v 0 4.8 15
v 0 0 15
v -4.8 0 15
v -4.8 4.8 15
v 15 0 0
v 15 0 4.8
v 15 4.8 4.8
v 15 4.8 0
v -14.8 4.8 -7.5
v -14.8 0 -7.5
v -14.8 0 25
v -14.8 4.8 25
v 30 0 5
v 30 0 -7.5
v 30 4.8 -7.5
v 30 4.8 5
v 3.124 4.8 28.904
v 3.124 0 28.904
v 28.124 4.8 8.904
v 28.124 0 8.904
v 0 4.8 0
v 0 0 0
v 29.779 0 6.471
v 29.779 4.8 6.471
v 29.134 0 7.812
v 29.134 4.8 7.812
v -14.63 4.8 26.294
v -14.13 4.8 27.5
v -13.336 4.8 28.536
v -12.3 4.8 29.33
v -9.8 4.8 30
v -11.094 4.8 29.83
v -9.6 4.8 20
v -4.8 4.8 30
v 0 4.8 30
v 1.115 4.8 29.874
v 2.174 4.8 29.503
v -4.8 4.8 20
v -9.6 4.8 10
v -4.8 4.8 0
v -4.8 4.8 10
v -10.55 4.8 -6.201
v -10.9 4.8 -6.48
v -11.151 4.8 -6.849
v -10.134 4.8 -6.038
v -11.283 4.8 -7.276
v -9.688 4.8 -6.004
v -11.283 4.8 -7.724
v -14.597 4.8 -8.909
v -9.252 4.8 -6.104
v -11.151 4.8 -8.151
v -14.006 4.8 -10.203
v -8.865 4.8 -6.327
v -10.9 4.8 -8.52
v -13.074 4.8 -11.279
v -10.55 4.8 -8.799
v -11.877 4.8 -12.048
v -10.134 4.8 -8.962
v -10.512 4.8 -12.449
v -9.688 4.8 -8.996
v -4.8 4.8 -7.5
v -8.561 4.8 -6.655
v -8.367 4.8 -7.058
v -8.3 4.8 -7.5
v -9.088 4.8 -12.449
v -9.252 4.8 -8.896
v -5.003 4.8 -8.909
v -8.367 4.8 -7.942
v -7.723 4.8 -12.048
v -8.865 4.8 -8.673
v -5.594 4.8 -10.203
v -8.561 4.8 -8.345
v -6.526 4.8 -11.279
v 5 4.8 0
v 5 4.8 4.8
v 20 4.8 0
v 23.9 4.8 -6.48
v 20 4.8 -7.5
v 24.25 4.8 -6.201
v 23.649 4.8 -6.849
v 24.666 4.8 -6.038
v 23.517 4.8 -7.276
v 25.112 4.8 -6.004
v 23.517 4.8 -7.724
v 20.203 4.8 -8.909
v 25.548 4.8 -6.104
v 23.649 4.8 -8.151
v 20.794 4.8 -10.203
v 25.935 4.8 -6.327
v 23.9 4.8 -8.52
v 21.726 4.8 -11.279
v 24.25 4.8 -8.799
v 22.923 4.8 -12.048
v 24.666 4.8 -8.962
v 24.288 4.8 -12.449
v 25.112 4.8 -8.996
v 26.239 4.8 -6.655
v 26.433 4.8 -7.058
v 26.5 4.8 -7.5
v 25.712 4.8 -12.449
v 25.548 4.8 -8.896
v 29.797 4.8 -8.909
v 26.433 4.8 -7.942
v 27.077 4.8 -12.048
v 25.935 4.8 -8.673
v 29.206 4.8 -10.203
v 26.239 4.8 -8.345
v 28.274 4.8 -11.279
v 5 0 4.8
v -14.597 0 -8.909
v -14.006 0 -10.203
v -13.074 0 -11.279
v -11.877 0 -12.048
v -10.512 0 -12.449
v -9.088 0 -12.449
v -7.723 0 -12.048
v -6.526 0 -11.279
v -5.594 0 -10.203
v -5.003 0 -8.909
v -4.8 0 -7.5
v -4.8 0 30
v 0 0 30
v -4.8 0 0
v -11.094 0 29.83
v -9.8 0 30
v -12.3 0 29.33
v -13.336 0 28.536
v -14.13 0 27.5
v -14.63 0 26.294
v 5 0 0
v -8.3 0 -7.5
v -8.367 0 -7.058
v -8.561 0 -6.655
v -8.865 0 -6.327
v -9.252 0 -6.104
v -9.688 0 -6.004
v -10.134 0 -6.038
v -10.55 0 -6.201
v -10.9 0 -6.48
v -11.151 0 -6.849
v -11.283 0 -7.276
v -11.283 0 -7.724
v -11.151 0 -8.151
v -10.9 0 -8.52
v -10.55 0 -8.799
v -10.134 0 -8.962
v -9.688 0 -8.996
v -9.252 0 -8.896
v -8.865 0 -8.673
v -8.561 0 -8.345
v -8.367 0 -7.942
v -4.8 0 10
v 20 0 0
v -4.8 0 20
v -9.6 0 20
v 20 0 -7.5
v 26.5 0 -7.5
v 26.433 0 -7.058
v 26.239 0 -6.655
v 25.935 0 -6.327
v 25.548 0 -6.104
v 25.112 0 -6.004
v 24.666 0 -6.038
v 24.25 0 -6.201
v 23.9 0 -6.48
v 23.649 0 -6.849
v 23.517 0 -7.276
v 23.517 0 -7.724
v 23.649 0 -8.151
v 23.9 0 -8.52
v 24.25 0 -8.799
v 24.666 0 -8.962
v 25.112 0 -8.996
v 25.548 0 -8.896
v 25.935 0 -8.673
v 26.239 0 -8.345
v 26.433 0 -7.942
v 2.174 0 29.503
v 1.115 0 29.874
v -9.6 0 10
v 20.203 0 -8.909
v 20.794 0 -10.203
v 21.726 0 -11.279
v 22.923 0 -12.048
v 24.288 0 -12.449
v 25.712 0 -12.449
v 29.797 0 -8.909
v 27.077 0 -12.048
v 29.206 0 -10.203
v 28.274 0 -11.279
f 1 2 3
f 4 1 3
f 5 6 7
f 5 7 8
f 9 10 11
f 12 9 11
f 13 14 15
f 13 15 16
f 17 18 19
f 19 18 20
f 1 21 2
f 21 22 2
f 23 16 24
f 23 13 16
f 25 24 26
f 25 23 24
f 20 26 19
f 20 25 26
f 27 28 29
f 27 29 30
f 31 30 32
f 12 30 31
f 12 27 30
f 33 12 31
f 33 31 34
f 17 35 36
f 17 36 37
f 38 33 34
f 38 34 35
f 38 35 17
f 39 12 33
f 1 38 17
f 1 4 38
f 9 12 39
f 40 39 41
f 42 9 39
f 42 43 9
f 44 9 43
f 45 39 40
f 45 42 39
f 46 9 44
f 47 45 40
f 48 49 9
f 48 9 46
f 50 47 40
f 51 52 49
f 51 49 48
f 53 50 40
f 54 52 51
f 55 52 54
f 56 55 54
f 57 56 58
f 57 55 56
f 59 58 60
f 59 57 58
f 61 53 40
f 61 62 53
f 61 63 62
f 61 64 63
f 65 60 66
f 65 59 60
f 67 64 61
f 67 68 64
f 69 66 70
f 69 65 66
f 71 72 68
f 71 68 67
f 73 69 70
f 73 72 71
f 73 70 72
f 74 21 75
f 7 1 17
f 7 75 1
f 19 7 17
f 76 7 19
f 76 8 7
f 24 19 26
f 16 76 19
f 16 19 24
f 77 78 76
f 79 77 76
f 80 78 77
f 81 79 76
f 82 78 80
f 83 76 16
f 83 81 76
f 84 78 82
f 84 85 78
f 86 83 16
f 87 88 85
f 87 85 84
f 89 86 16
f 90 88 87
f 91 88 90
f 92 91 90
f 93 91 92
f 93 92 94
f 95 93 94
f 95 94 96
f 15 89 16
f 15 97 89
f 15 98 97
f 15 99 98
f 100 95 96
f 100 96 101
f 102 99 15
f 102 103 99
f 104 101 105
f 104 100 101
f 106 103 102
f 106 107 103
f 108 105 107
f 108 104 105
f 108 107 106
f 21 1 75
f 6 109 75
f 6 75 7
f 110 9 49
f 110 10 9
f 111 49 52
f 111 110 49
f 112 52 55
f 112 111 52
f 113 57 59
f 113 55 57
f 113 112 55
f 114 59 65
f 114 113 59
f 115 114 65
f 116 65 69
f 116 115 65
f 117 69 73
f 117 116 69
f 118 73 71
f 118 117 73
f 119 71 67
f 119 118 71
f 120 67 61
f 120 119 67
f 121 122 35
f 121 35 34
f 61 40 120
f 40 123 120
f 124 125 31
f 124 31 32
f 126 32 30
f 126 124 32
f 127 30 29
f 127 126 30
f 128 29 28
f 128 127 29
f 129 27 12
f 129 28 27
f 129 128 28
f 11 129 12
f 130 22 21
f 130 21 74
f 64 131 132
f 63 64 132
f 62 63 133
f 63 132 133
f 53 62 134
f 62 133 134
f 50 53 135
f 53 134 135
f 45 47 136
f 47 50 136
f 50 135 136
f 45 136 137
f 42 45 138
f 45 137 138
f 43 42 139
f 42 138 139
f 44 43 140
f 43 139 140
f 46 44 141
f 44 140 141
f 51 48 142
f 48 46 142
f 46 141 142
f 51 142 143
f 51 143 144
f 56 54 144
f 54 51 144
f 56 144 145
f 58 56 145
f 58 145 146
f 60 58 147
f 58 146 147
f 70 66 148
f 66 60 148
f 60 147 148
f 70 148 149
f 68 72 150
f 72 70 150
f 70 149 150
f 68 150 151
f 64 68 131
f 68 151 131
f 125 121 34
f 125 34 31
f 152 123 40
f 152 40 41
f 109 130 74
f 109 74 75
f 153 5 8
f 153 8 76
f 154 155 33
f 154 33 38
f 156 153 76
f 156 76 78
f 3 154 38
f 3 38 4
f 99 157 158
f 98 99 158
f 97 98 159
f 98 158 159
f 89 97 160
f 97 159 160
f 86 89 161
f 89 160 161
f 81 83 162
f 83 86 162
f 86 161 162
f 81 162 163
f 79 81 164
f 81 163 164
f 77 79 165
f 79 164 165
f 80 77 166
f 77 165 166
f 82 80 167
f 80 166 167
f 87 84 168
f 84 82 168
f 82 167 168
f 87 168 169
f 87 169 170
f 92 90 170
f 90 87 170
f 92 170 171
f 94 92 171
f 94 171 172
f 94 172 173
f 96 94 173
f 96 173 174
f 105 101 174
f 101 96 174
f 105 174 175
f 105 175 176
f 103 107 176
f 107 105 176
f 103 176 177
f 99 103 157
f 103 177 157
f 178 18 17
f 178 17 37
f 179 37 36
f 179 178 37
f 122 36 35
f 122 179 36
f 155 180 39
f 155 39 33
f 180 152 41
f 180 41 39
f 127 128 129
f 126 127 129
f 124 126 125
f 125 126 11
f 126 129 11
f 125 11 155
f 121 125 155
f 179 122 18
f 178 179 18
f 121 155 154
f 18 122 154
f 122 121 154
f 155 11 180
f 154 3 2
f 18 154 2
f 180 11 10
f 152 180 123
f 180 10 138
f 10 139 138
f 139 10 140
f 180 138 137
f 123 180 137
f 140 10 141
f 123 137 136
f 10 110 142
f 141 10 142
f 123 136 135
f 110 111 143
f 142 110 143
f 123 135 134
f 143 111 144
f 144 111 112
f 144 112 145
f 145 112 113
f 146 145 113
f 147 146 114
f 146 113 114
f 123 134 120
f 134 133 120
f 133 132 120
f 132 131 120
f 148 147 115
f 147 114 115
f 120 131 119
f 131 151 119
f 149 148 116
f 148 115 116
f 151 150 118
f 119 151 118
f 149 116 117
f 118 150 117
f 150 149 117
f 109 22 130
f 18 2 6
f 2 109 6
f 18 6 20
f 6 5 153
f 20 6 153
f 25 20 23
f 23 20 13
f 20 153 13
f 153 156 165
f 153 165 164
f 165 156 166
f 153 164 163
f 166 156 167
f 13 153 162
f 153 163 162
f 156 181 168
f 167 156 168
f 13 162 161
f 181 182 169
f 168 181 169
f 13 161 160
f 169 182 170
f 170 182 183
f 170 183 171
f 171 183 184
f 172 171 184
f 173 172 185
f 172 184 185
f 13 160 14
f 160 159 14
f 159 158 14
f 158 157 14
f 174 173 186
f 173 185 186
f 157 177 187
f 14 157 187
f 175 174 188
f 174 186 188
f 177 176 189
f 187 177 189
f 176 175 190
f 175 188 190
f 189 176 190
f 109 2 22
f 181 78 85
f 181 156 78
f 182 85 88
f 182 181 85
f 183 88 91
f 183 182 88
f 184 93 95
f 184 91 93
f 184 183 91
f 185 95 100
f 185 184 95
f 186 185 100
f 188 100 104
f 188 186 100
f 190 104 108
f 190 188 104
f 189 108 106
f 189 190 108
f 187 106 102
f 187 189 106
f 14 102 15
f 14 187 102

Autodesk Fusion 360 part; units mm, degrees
sketch "Sketch1" plane through (0, 0, 0) normal (0, 1, 0) x (1, 0, 0)
  line L0 (-4.8, 0) -> (-4.8, -10)
  line L1 (0, 0) -> (0, -15)
  line L2 (0, -15) -> (-4.8, -15)
  line L3 (0, 0) -> (-4.8, 0) construction
  line L4 (-4.8, 0) -> (-4.8, 7.5)
  line L5 (0, -30) -> (-4.8, -30)
  line L6 (0, -15) -> (0, -30) construction
  line L7 (-4.8, -15) -> (-4.8, -30) construction
  line L8 (-4.8, -30) -> (-9.8, -30)
  line L9 (-14.8, 7.5) -> (-14.8, -25)
  arc A0 (-9.8, -30) -> (-14.8, -25) centre (-9.8, -25) ccw construction
  arc A1 (-14.8, -25) -> (-9.8, -30) centre (-9.8, -25) ccw
  arc A2 (-14.8, 7.5) -> (-4.8, 7.5) centre (-9.8, 7.5) ccw construction
  arc A3 (-4.8, 7.5) -> (-14.8, 7.5) centre (-9.8, 7.5) ccw
  circle A4 centre (-9.8, 7.5) radius 1.5
  line L10 (0, 0) -> (5, 0)
  line L11 (5, 0) -> (5, -4.8)
  line L12 (5, -4.8) -> (15, -4.8)
  line L13 (15, -4.8) -> (15, 0)
  line L14 (15, 0) -> (20, 0)
  line L15 (20, 0) -> (20, 7.5)
  line L16 (30, 7.5) -> (30, -5)
  line L17 (3.1235, -28.9043) -> (28.1235, -8.9043)
  arc A5 (3.1235, -28.9043) -> (0, -30) centre (0, -25) ccw construction
  arc A6 (0, -30) -> (3.1235, -28.9043) centre (0, -25) ccw
  arc A7 (30, -5) -> (28.1235, -8.9043) centre (25, -5) ccw construction
  arc A8 (28.1235, -8.9043) -> (30, -5) centre (25, -5) ccw
  arc A9 (20, 7.5) -> (30, 7.5) centre (25, 7.5) ccw construction
  arc A10 (30, 7.5) -> (20, 7.5) centre (25, 7.5) ccw
  circle A11 centre (25, 7.5) radius 1.5
  line L18 (-4.8, -10) -> (-9.6, -10)
  line L19 (-9.6, -10) -> (-9.6, -20)
  line L20 (-9.6, -20) -> (-4.8, -20)
  line L21 (-4.8, -20) -> (-4.8, -15)
  line L22 (-9.8, 7.5) -> (-9.8, -25) construction
  line L23 (-4.8, 7.5) -> (20, 7.5) construction
  dimension "d1" = 15
  dimension "d3" = 4.8
  dimension "d4" = 7.5
  dimension "d5" = 4.8
  dimension "d6" = 15
  dimension "d7" = 10
  dimension "d8" = 10
  dimension "d9" = 3
  dimension "d10" = 5
  dimension "d11" = 4.8
  dimension "d12" = 10
  dimension "d13" = 4.8
  dimension "d14" = 5
  dimension "d16" = 10
  dimension "d17" = 10
  dimension "d18" = 5
  dimension "d19" = 5
  dimension "d20" = 5
  dimension "d21" = 3
  dimension "d22" = 4.8
  dimension "d23" = 10
  dimension "d24" = 5
extrude "Extrude1" add sketch "Sketch1" along normal blind 4.8
